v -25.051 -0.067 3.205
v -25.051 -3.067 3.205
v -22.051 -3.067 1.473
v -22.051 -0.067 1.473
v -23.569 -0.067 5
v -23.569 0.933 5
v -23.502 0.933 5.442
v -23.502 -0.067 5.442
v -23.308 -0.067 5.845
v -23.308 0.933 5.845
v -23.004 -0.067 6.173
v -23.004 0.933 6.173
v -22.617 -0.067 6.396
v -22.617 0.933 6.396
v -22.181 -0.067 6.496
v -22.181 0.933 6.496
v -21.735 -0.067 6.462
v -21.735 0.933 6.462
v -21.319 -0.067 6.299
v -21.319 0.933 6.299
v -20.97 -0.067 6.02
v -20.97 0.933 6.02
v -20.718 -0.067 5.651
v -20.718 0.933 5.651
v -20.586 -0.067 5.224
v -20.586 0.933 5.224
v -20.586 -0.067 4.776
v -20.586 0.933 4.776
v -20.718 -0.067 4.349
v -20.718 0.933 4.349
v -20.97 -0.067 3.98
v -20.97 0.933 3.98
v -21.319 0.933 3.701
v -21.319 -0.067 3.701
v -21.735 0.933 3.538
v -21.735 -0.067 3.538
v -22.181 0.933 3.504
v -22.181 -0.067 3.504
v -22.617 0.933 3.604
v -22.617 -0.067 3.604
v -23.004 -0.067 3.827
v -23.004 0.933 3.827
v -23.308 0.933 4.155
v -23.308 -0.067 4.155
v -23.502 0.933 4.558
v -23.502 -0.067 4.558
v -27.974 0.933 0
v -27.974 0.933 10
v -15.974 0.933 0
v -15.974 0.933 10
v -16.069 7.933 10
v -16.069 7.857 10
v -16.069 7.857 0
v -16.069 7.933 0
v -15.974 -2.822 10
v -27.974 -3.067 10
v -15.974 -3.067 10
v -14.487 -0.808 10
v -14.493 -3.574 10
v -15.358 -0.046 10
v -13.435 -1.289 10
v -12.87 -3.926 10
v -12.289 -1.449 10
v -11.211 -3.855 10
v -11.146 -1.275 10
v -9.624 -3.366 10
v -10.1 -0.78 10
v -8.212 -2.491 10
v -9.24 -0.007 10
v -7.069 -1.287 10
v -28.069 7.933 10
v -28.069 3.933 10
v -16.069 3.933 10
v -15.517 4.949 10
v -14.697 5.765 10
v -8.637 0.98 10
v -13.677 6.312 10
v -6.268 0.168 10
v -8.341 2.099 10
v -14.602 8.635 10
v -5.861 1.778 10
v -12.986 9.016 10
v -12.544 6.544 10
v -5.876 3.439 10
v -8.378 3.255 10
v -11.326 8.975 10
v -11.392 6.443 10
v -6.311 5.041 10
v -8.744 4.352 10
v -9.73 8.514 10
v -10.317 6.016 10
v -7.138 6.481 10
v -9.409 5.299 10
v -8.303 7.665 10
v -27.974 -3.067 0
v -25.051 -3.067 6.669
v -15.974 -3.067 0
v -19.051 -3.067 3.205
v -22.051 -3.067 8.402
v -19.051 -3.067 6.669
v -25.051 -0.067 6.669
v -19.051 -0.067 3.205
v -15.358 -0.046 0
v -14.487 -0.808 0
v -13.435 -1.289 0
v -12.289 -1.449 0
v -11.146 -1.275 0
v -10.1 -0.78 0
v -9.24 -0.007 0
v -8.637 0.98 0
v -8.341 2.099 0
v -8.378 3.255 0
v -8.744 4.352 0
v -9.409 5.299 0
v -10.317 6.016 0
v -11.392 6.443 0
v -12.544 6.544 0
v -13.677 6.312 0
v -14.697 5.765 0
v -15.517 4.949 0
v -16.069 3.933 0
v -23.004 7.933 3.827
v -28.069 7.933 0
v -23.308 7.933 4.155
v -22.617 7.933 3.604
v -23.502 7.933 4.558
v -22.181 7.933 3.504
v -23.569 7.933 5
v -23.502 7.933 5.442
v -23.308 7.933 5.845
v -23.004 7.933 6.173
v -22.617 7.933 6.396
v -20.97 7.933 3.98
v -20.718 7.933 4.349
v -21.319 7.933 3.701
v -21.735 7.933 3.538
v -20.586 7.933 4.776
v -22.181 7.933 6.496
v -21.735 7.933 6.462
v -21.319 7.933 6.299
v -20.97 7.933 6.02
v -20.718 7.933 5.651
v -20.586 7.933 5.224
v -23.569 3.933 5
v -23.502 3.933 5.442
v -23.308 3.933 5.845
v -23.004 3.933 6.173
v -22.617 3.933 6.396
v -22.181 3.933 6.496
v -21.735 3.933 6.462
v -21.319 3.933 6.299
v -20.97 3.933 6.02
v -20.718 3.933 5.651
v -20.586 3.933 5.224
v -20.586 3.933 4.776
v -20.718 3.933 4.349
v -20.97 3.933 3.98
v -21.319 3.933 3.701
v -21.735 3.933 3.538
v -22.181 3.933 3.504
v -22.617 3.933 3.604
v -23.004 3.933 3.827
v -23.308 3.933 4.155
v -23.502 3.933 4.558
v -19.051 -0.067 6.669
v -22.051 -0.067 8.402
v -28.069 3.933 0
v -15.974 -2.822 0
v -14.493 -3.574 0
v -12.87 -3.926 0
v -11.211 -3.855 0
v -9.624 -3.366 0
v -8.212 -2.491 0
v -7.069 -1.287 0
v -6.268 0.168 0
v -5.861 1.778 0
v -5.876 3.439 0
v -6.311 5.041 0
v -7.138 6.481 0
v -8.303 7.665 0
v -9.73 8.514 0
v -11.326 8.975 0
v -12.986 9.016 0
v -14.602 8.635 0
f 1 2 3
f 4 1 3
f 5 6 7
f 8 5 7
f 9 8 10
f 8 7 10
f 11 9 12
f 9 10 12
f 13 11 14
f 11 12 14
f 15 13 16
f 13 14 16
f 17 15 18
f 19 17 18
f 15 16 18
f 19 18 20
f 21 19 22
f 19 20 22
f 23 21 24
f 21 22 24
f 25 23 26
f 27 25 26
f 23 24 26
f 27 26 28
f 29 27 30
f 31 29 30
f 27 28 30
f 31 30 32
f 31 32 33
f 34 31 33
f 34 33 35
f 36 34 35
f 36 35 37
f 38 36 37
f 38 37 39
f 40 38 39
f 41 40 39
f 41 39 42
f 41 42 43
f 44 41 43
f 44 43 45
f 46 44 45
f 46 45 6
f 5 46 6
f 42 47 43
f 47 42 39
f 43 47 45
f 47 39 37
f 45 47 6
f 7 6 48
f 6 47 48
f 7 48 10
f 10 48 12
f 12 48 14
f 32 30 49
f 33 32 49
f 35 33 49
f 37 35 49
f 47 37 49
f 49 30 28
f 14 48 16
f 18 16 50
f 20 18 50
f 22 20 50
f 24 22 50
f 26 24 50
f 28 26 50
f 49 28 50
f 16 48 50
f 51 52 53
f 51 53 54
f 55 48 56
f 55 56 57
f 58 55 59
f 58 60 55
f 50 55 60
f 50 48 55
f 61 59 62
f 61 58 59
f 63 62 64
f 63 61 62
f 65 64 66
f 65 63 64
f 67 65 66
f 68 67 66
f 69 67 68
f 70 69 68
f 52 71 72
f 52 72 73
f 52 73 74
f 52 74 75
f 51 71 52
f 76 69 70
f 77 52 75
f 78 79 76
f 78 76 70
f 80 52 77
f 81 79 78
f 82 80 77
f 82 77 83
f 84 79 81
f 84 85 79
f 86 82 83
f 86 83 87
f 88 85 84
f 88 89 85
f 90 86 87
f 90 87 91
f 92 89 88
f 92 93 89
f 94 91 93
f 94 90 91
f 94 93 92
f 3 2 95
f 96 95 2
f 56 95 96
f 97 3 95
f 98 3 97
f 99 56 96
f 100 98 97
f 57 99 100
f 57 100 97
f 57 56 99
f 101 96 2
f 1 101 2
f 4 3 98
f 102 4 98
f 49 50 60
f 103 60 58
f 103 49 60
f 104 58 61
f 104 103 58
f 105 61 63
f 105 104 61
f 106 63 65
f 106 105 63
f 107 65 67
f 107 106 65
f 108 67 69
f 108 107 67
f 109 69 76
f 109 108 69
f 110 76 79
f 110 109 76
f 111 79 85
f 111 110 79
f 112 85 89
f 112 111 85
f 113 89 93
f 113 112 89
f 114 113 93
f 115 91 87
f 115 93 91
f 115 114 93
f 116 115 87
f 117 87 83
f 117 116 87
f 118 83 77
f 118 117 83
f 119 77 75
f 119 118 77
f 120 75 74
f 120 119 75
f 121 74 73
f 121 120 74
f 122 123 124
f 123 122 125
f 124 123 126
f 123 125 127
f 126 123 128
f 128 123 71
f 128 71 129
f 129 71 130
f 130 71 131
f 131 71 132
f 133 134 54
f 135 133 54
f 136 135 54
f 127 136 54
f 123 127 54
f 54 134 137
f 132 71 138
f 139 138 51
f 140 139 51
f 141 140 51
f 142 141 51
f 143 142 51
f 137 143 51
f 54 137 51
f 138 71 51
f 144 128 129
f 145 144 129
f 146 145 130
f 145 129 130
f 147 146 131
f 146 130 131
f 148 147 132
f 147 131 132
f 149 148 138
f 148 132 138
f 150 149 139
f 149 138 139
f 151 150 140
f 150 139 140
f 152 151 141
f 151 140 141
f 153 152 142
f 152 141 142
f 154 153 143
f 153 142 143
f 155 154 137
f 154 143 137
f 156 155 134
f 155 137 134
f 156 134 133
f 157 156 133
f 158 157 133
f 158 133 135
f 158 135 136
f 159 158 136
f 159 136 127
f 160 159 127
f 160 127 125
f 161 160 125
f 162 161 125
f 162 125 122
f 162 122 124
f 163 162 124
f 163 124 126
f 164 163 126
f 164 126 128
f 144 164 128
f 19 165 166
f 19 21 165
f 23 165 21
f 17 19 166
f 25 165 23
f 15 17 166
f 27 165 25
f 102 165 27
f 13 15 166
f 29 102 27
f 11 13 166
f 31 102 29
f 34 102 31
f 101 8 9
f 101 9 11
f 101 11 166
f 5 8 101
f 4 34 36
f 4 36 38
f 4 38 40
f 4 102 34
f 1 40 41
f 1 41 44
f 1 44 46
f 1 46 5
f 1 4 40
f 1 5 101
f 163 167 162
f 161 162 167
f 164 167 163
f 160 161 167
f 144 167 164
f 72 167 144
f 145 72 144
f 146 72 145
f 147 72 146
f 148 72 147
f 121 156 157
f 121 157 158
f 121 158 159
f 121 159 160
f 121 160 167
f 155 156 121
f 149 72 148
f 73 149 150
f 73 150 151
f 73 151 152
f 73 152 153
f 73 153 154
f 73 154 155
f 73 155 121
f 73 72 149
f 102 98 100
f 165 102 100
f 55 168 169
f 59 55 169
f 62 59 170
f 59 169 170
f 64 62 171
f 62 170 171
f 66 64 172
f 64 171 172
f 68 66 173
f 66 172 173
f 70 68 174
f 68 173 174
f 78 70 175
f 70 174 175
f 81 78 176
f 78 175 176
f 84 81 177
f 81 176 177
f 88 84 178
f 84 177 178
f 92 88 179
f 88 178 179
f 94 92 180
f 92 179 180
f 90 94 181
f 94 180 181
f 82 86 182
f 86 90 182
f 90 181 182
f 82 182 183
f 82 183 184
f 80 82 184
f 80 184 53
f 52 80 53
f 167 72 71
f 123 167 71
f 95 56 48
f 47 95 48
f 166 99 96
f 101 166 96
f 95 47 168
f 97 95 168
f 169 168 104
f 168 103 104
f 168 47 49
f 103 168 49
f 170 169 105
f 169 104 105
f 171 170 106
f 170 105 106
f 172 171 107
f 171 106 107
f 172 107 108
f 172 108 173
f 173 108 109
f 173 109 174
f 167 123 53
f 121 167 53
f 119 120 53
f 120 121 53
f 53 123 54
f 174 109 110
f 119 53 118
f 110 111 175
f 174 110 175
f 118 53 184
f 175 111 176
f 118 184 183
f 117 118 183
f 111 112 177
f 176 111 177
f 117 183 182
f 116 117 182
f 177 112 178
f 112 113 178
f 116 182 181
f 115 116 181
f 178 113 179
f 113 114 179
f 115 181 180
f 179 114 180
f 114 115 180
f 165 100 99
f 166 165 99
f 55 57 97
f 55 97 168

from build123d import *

# Parameters (mm, degrees)
SKETCH1_R           = 6.5
SKETCH1_R_2         = 4
BOSS_EXTRUDE1_DEPTH = 10
SKETCH2_W           = 3.218226301
SKETCH2_H           = 3
CUT_EXTRUDE1_DEPTH  = 33
SKETCH3_W           = 12
SKETCH3_H           = 4
BOSS_EXTRUDE2_DEPTH = 10
SKETCH4_R           = 1.5
CUT_EXTRUDE2_DEPTH  = 40
CUT_EXTRUDE3_DEPTH  = 3


with BuildPart() as part:
    # Sketch1 → Boss-Extrude1 (new body)
    with BuildSketch(Plane.XY):
        with Locations((-12.315422017, 2.550703256)):
            Circle(SKETCH1_R)
        with Locations((-12.315422017, 2.550703256)):
            Circle(SKETCH1_R_2, mode=Mode.SUBTRACT)
    extrude(amount=BOSS_EXTRUDE1_DEPTH)

    # Sketch2 → Cut-Extrude1 (cut)
    with BuildSketch(Plane.XY.offset(10)):
        with Locations((-17.357309889, 2.432650589)):
            Rectangle(SKETCH2_W, SKETCH2_H)
    extrude(amount=-CUT_EXTRUDE1_DEPTH, mode=Mode.SUBTRACT)

    # Sketch3 → Boss-Extrude2 (add)
    with BuildSketch(Plane.XY.offset(10)):
        with Locations((-21.973550714, -1.067349411)):
            Rectangle(SKETCH3_W, SKETCH3_H)
        with Locations((-22.069116407, 5.932650589)):
            Rectangle(SKETCH3_W, SKETCH3_H)
    extrude(amount=-BOSS_EXTRUDE2_DEPTH)

    # Sketch4 → Cut-Extrude2 (cut)
    with BuildSketch(Plane(origin=(0, 7.932650589, 0), x_dir=(1, 0, 0), z_dir=(0, 1, 0))):
        with Locations(Location((-22.069116407, -5, 0), (0, 0, 180))):
            Circle(SKETCH4_R)
    extrude(amount=-CUT_EXTRUDE2_DEPTH, mode=Mode.SUBTRACT)

    # Sketch5 → Cut-Extrude3 (cut)
    with BuildSketch(Plane(origin=(0, -3.067349411, 0), x_dir=(-1, 0, 0), z_dir=(0, -1, 0))):
        Polygon((19.051149057, -6.669474185), (22.051149057, -8.401524993), (25.051149057, -6.669474185), (25.051149057, -3.20537257), (22.051149057, -1.473321762), (19.051149057, -3.20537257), align=None)
    extrude(amount=-CUT_EXTRUDE3_DEPTH, mode=Mode.SUBTRACT)


solid = part.part
